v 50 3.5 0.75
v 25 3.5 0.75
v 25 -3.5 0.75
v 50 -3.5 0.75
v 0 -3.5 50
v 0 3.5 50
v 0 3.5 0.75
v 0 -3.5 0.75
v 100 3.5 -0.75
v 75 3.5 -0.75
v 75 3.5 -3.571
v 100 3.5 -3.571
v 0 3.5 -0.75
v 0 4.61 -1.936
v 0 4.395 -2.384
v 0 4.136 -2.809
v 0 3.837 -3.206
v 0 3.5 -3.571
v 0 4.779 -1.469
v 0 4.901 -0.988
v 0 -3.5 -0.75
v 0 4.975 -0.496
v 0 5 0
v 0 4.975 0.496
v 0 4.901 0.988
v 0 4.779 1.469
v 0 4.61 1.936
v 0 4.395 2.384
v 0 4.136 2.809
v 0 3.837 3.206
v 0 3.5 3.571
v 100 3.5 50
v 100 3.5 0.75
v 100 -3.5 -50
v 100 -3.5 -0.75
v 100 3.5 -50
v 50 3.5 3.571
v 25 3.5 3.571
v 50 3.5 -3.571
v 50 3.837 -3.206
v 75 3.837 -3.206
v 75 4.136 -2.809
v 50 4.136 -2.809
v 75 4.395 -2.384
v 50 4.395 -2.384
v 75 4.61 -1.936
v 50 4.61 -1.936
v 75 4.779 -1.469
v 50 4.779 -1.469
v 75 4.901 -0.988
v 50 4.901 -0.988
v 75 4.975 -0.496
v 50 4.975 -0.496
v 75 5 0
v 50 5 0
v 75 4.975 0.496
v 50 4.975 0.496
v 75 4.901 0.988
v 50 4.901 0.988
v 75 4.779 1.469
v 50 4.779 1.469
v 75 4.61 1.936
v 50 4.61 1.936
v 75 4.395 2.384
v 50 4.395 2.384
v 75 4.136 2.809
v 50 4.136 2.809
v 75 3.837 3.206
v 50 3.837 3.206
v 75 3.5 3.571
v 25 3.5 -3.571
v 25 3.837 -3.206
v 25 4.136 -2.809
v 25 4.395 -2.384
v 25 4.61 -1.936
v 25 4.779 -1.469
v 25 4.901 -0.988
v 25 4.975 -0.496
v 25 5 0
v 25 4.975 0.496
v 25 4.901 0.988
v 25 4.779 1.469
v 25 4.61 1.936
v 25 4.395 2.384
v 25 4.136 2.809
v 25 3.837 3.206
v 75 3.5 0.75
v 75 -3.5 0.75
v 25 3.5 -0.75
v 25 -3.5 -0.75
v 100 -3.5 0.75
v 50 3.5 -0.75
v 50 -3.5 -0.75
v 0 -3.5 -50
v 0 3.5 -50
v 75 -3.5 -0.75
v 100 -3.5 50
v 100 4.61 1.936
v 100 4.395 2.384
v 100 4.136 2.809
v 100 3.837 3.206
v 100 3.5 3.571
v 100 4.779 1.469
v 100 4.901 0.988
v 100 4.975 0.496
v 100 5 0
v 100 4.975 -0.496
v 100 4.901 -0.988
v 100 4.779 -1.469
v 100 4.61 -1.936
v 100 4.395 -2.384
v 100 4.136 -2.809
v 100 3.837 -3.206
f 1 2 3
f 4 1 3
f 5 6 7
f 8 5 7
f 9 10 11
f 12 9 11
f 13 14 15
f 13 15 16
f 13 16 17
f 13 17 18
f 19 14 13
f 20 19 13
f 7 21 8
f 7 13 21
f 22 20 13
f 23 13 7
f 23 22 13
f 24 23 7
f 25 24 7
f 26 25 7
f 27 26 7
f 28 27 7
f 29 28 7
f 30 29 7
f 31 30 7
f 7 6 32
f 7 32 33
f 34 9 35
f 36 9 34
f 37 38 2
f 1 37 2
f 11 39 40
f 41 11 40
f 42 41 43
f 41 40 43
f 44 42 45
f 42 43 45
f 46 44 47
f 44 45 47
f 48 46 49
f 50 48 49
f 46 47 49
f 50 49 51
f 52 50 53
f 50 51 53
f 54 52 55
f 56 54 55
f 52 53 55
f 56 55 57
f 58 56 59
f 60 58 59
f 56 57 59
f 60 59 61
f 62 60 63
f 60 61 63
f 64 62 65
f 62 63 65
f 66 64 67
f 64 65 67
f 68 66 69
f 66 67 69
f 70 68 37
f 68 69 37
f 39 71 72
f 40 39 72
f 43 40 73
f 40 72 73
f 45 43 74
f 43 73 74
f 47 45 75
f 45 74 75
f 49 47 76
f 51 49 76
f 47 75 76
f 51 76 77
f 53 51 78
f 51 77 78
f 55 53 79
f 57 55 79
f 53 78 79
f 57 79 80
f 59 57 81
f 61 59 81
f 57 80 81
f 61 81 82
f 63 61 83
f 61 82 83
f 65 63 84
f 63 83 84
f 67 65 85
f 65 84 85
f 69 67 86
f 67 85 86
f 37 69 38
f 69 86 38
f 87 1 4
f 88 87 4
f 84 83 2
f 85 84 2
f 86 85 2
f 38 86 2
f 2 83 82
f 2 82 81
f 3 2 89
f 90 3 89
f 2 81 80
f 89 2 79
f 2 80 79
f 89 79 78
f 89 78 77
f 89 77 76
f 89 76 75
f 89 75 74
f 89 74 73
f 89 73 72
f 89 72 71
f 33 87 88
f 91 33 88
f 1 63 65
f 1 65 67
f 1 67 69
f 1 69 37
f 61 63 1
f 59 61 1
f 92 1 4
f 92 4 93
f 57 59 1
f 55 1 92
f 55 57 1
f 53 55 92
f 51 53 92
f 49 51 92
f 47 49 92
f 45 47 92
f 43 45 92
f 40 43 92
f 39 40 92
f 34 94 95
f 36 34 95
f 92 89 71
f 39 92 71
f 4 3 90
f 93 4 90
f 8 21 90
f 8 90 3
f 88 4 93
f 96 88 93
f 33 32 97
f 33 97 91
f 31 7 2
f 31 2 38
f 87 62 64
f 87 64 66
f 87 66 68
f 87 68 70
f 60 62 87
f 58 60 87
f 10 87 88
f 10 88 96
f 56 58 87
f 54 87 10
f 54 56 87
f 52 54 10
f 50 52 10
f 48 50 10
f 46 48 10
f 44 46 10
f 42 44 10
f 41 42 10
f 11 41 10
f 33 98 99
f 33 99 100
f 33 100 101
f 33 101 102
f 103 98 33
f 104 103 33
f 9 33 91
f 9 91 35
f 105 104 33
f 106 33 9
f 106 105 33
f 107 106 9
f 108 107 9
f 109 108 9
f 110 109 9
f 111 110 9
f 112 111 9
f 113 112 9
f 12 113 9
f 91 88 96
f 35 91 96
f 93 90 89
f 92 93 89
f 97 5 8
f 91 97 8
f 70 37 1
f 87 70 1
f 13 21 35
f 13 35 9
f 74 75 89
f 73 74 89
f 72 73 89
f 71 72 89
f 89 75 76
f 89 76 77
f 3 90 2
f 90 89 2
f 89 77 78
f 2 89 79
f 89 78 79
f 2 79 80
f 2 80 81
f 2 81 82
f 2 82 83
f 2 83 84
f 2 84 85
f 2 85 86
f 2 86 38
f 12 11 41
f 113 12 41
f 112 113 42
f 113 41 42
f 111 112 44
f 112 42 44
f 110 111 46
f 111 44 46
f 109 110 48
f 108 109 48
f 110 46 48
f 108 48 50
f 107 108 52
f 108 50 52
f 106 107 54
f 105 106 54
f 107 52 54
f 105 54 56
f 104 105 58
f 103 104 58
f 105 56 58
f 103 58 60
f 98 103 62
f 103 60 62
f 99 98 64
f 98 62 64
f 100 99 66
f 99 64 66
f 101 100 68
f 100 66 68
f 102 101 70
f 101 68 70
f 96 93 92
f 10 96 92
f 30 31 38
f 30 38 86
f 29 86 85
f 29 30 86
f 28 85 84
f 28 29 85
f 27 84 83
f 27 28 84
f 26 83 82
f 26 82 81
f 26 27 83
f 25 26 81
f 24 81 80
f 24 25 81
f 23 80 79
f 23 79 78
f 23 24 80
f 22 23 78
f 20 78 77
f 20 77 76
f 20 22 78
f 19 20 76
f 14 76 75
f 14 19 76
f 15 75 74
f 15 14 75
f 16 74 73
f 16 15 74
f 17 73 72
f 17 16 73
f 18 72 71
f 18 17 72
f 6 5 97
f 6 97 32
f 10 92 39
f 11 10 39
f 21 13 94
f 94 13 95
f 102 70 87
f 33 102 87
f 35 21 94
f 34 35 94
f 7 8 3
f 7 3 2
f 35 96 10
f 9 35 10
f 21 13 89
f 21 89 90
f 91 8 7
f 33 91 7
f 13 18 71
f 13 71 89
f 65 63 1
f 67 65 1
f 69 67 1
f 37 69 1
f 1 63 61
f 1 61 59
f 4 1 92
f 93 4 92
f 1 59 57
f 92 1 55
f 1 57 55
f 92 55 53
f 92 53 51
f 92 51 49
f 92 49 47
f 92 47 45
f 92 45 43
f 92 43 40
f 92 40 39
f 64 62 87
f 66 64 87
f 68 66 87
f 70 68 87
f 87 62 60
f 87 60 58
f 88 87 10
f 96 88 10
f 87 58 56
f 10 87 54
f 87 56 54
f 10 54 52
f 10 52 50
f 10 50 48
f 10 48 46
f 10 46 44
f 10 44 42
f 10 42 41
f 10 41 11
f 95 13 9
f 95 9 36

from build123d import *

# Parameters (mm, degrees)
SKETCH1_W             = 49.25
SKETCH1_H             = 7
BOSS_EXTRUDE1_DEPTH   = 100
BOSS_EXTRUDE1_2_DEPTH = 100
BOSS_EXTRUDE2_DEPTH   = 25
BOSS_EXTRUDE3_DEPTH   = 25
BOSS_EXTRUDE4_DEPTH   = 25
BOSS_EXTRUDE5_DEPTH   = 25


with BuildPart() as part:
    # Sketch1 → Boss-Extrude1 (new body)
    with BuildSketch(Plane(origin=(0, 0, 0), x_dir=(0, 0, -1), z_dir=(1, 0, 0))):
        with Locations((-25.375, 0)):
            Rectangle(SKETCH1_W, SKETCH1_H)
    extrude(amount=BOSS_EXTRUDE1_DEPTH)


with BuildPart() as body_2:
    # Sketch1 → Boss-Extrude1 2 (new body)
    with BuildSketch(Plane(origin=(0, 0, 0), x_dir=(0, 0, -1), z_dir=(1, 0, 0))):
        with Locations((25.375, 0)):
            Rectangle(SKETCH1_W, SKETCH1_H)
    extrude(amount=BOSS_EXTRUDE1_2_DEPTH)


with BuildPart() as body_3:
    # Sketch2 → Boss-Extrude2 (new body)
    with BuildSketch(Plane.ZY):
        with BuildLine():
            Line((-0.75, -3.5), (0.75, -3.5))
            Line((0.75, -3.5), (0.75, 3.5))
            Line((0.75, 3.5), (3.570714214, 3.5))
            ThreePointArc((3.570714214, 3.5), (0, 5), (-3.570714214, 3.5))
            Line((-3.570714214, 3.5), (-0.75, 3.5))
            Line((-0.75, 3.5), (-0.75, -3.5))
        make_face()
    extrude(amount=-BOSS_EXTRUDE2_DEPTH)


with BuildPart() as body_4:
    # Sketch3 → Boss-Extrude3 (new body)
    with BuildSketch(Plane(origin=(25, 0, 0), x_dir=(0, 0, -1), z_dir=(1, 0, 0))):
        with BuildLine():
            Line((-3.570714214, 3.5), (-0.75, 3.5))
            Line((-0.75, 3.5), (-0.75, -3.5))
            Line((-0.75, -3.5), (0.75, -3.5))
            Line((0.75, -3.5), (0.75, 3.5))
            Line((0.75, 3.5), (3.570714214, 3.5))
            ThreePointArc((3.570714214, 3.5), (0, 5), (-3.570714214, 3.5))
        make_face()
    extrude(amount=BOSS_EXTRUDE3_DEPTH)


with BuildPart() as body_5:
    # Sketch4 → Boss-Extrude4 (new body)
    with BuildSketch(Plane(origin=(50, 0, 0), x_dir=(0, 0, -1), z_dir=(1, 0, 0))):
        with BuildLine():
            Line((-3.570714214, 3.5), (-0.75, 3.5))
            Line((-0.75, 3.5), (-0.75, -3.5))
            Line((-0.75, -3.5), (0.75, -3.5))
            Line((0.75, -3.5), (0.75, 3.5))
            Line((0.75, 3.5), (3.570714214, 3.5))
            ThreePointArc((3.570714214, 3.5), (0, 5), (-3.570714214, 3.5))
        make_face()
    extrude(amount=BOSS_EXTRUDE4_DEPTH)


with BuildPart() as body_6:
    # Sketch5 → Boss-Extrude5 (new body)
    with BuildSketch(Plane(origin=(75, 0, 0), x_dir=(0, 0, -1), z_dir=(1, 0, 0))):
        with BuildLine():
            Line((-3.570714214, 3.5), (-0.75, 3.5))
            Line((-0.75, 3.5), (-0.75, -3.5))
            Line((-0.75, -3.5), (0.75, -3.5))
            Line((0.75, -3.5), (0.75, 3.5))
            Line((0.75, 3.5), (3.570714214, 3.5))
            ThreePointArc((3.570714214, 3.5), (0, 5), (-3.570714214, 3.5))
        make_face()
    extrude(amount=BOSS_EXTRUDE5_DEPTH)


solid = Compound([part.part, body_2.part, body_3.part, body_4.part, body_5.part, body_6.part])
